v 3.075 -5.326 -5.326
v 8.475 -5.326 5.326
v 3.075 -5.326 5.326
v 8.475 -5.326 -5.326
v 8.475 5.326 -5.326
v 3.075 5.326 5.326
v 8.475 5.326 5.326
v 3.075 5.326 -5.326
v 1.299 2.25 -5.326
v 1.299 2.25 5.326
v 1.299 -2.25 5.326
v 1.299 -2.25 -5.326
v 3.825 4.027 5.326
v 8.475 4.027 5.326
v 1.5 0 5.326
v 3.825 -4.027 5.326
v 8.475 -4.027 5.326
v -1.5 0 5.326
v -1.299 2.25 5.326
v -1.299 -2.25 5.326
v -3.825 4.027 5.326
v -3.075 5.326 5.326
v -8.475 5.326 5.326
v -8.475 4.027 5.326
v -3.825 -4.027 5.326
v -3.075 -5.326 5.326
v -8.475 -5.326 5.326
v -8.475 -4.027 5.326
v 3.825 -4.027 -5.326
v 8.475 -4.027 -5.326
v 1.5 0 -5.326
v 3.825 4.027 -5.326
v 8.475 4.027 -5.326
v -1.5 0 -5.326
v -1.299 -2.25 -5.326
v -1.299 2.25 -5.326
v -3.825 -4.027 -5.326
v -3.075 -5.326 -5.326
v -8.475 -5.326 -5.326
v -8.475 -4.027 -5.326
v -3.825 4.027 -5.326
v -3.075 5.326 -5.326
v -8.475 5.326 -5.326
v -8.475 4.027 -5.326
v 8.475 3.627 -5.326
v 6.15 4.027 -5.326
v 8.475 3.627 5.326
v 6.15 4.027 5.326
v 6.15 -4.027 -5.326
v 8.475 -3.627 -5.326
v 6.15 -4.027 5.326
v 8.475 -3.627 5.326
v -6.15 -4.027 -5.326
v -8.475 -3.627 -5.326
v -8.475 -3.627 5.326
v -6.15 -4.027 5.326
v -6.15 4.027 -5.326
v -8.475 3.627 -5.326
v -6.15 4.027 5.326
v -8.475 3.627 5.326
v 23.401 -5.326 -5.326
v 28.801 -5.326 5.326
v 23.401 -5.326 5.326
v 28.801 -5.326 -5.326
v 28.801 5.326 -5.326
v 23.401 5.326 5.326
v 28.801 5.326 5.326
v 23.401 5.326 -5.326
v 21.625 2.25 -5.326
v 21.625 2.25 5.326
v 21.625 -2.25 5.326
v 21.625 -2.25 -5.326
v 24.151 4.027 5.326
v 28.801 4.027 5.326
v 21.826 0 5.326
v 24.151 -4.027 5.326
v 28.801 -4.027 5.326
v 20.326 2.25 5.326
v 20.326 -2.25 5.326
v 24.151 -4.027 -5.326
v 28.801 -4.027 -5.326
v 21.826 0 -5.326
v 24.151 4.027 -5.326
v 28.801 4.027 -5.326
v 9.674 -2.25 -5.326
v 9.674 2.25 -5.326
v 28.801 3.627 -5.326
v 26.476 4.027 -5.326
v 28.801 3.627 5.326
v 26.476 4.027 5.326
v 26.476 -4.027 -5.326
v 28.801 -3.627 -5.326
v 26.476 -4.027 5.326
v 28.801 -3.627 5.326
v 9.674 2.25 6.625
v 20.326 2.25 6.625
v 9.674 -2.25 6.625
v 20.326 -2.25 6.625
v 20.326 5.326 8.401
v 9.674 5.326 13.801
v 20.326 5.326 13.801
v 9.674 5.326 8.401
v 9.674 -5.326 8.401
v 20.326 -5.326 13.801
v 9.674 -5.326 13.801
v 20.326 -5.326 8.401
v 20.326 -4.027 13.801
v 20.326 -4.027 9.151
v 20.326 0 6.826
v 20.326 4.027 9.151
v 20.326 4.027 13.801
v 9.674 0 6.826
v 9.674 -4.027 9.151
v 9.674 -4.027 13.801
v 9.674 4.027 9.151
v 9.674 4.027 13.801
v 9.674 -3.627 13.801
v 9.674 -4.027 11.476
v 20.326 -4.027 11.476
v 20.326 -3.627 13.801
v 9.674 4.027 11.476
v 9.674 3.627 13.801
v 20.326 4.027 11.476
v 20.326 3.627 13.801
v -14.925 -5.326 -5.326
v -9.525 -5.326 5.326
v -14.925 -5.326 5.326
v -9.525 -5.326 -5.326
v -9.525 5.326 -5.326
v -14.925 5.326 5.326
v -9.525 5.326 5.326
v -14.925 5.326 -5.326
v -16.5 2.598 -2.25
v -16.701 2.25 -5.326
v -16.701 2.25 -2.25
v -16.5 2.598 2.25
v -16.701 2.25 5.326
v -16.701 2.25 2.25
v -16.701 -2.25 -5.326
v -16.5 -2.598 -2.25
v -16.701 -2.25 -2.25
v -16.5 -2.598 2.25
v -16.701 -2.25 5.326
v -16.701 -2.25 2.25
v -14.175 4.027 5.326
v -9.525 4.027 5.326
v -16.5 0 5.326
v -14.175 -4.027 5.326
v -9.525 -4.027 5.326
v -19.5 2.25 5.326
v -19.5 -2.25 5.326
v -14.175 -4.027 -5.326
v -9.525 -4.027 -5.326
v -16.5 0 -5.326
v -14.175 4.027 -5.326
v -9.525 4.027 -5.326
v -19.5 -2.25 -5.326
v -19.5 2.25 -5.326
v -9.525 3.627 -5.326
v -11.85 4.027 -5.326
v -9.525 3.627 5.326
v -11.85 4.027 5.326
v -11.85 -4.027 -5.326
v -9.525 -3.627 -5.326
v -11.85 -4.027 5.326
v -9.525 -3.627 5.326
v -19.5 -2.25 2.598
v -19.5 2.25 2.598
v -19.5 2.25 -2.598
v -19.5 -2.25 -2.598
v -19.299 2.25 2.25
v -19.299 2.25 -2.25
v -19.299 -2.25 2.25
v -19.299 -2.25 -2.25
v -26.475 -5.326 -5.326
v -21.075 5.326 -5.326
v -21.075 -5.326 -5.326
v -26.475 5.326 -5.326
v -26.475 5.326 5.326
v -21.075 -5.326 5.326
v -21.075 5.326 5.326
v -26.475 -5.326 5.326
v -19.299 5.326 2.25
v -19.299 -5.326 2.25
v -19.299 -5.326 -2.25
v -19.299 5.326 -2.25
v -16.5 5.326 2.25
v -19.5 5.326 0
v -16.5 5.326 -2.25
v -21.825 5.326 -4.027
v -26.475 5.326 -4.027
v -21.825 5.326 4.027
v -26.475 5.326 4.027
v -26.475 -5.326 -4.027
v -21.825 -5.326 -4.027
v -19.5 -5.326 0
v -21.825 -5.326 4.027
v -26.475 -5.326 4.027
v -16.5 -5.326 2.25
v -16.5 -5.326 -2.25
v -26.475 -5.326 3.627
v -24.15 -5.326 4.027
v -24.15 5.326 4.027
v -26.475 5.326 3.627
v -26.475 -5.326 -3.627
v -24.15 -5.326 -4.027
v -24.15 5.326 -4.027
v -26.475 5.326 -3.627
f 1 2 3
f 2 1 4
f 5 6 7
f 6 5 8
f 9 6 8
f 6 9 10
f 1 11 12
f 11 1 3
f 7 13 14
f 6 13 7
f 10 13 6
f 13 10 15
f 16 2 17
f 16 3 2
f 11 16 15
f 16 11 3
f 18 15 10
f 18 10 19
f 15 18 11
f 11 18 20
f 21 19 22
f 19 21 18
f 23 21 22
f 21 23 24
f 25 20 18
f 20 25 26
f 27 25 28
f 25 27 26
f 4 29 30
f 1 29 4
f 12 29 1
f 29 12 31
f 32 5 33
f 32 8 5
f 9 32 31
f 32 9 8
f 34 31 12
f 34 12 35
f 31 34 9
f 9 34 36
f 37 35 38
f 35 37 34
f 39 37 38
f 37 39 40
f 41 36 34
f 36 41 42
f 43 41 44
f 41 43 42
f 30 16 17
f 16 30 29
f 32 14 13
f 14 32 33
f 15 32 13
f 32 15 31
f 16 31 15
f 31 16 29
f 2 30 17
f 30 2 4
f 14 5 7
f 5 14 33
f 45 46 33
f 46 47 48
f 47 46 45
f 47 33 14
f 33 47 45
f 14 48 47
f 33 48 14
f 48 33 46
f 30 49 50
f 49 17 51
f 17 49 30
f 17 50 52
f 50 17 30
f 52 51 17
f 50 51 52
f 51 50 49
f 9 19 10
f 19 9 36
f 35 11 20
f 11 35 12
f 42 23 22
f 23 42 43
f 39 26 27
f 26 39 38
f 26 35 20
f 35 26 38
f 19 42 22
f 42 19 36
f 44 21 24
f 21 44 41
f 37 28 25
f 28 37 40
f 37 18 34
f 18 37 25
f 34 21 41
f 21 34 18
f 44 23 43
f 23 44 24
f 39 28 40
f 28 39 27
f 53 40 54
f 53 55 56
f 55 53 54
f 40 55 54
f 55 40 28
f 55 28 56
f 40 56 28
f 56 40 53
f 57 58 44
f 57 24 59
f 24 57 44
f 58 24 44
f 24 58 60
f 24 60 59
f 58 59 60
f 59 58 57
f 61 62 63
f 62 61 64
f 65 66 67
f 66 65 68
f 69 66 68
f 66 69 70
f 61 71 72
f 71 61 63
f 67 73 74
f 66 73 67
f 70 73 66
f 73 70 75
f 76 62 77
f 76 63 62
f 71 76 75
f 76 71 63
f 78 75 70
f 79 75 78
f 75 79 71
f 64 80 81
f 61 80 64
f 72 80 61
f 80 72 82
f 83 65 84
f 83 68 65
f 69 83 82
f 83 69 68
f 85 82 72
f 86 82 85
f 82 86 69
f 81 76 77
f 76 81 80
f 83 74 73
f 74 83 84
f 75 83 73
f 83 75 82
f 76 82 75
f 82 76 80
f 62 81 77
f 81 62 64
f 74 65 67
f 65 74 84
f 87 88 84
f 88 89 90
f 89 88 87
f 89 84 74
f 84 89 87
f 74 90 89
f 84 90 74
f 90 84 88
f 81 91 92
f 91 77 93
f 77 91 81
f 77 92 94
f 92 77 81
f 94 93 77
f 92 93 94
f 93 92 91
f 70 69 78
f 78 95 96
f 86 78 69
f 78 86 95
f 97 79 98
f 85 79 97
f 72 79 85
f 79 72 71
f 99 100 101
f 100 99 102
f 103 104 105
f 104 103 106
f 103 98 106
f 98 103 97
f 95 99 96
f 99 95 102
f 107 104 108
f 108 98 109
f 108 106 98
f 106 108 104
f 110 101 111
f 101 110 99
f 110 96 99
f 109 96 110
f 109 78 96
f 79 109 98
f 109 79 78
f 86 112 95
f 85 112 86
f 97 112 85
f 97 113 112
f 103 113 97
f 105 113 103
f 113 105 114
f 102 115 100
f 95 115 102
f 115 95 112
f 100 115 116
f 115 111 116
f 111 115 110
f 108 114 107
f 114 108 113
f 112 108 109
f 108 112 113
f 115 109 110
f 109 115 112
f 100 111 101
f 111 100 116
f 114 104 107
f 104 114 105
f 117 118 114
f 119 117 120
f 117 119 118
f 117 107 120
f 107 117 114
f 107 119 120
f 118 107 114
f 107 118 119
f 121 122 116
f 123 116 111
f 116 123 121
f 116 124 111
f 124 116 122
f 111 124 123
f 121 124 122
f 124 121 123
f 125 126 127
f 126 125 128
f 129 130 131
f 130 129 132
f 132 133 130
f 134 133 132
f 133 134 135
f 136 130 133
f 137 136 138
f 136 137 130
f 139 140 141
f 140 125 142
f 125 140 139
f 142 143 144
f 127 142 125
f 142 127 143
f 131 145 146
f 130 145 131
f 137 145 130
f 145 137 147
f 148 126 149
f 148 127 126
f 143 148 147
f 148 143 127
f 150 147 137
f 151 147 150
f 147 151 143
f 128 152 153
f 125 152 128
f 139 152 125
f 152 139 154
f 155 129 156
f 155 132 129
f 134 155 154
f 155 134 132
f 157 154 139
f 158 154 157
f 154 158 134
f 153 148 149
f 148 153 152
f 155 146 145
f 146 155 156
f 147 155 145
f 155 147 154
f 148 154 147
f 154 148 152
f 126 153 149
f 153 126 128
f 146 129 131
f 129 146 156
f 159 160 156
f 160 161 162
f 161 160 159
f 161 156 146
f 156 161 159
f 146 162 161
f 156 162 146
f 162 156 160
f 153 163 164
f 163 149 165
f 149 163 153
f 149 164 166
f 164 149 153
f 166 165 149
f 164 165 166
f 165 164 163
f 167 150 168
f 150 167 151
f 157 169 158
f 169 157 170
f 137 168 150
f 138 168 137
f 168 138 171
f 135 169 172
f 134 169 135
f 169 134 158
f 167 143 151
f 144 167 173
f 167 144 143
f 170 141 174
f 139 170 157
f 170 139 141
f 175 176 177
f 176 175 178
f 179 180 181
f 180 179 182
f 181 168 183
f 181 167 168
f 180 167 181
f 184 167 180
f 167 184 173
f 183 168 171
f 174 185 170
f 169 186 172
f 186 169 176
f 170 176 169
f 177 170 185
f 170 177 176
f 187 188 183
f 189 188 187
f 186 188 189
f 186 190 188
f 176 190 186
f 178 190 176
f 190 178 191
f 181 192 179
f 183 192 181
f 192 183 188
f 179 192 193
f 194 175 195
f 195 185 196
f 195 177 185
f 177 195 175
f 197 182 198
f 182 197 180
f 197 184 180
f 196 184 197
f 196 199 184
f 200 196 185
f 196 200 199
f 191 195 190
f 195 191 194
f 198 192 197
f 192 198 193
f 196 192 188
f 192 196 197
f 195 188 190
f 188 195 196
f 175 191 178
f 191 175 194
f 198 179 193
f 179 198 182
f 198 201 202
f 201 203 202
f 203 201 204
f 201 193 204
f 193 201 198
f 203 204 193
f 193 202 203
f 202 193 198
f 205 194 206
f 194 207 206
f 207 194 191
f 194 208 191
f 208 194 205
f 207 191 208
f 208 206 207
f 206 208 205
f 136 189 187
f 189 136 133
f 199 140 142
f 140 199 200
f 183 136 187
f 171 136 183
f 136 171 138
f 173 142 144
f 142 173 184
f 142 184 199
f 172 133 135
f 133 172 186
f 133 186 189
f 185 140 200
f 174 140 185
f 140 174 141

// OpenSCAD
PENCIL_DIA = 7;
PENCIL_LEAD_DIA = 2;
PENCIL_LENGTH = 190;
PENCIL_HEAD_LENGTH = 10;
PENCIL_COLOR = "yellow";

SNAP_W = 1.5;
SNAP_INNER_DIA = 9.3;
SNAP_CLAW_WIDTH = 0.4;
SNAP_OUTER_DIA = SNAP_INNER_DIA + 2*SNAP_W;
SNAP_COLOR = "gray";
SNAP_H = SNAP_OUTER_DIA * cos(30);

module pencil() {
	
	difference() {
		union() {
			difference() {
				color(PENCIL_COLOR) cylinder(h = PENCIL_LENGTH, d = PENCIL_DIA, center = true, $fn = 6);  
				cylinder(h = PENCIL_LENGTH+1, d = PENCIL_LEAD_DIA, center = true, $fn = 30);  
			}
			color("black") cylinder(h = PENCIL_LENGTH, d = PENCIL_LEAD_DIA, center = true, $fn = 30);
		}
		translate([0, 0, (PENCIL_LENGTH-PENCIL_HEAD_LENGTH)/2]) difference() {
			translate([0, 0, 1]) cylinder(h = PENCIL_HEAD_LENGTH+1, d = PENCIL_DIA, center = true, $fn = 30);
			cylinder(h = PENCIL_HEAD_LENGTH, d1 = PENCIL_DIA, d2 = 0, center = true, $fn = 30);
		}
	}
}

module snap_claw() {
	color(SNAP_COLOR)
	union () {
		# translate([0,0,0]) cube([2*SNAP_W, 3*SNAP_W, SNAP_H], center = true);
		translate([SNAP_OUTER_DIA/2, 0, 0]) union() {
			difference() {
				cylinder(h = SNAP_H, d = SNAP_OUTER_DIA, center = true, $fn = 6);
				cylinder(h = SNAP_H+1, d = SNAP_INNER_DIA, center = true, $fn = 6);
				translate([SNAP_OUTER_DIA/2 + SNAP_INNER_DIA/2*sin(30), 0, 0]) cube(SNAP_OUTER_DIA, SNAP_OUTER_DIA, SNAP_H, center = true);
			}
			linear_extrude(height = SNAP_H, center = true, convexity = 2, twist = 0)
				polygon(points=[[SNAP_INNER_DIA/2 * sin(30), SNAP_INNER_DIA/2 * cos(30)],
							    	 [0, SNAP_INNER_DIA/2 * cos(30)],
         	             	 [SNAP_INNER_DIA/2 * sin(30), SNAP_INNER_DIA/2 * cos(30)-SNAP_CLAW_WIDTH]], paths=[[0,1,2]]);

			linear_extrude(height = SNAP_H, center = true, convexity = 2, twist = 0)
				polygon(points=[[SNAP_INNER_DIA/2 * sin(30), -SNAP_INNER_DIA/2 * cos(30)],
							 		 [0, -SNAP_INNER_DIA/2 * cos(30)],
	      	                [SNAP_INNER_DIA/2 * sin(30), -SNAP_INNER_DIA/2 * cos(30)+SNAP_CLAW_WIDTH]], paths=[[0,1,2]]);
		}
	}
}

module snap_turn () {
	union() {
		translate([SNAP_H/2, 0, 0]) snap_claw();
		translate([0, 0, (SNAP_H)/2]) rotate([0, -90, 180]) snap_claw();
		# color(SNAP_COLOR)  cube([SNAP_H, 3*SNAP_W, SNAP_H], center = true);
	}
}

module snap_twist () {
	union() {
		snap_claw();
		rotate([90, 0, 180]) snap_claw();
	}
}


module snap_inline () {
	union() {
		snap_claw();
		rotate([0, 0, 180]) snap_claw();
	}
}

// pencil();
//translate([SNAP_OUTER_DIA/2, 0, 0]) snap_simple();
//snap_twist();

translate([0,0,0]) {
	snap_inline();
	translate([15, 0, 0]) snap_turn();
	translate([-18, 0, 0]) snap_twist();
}
